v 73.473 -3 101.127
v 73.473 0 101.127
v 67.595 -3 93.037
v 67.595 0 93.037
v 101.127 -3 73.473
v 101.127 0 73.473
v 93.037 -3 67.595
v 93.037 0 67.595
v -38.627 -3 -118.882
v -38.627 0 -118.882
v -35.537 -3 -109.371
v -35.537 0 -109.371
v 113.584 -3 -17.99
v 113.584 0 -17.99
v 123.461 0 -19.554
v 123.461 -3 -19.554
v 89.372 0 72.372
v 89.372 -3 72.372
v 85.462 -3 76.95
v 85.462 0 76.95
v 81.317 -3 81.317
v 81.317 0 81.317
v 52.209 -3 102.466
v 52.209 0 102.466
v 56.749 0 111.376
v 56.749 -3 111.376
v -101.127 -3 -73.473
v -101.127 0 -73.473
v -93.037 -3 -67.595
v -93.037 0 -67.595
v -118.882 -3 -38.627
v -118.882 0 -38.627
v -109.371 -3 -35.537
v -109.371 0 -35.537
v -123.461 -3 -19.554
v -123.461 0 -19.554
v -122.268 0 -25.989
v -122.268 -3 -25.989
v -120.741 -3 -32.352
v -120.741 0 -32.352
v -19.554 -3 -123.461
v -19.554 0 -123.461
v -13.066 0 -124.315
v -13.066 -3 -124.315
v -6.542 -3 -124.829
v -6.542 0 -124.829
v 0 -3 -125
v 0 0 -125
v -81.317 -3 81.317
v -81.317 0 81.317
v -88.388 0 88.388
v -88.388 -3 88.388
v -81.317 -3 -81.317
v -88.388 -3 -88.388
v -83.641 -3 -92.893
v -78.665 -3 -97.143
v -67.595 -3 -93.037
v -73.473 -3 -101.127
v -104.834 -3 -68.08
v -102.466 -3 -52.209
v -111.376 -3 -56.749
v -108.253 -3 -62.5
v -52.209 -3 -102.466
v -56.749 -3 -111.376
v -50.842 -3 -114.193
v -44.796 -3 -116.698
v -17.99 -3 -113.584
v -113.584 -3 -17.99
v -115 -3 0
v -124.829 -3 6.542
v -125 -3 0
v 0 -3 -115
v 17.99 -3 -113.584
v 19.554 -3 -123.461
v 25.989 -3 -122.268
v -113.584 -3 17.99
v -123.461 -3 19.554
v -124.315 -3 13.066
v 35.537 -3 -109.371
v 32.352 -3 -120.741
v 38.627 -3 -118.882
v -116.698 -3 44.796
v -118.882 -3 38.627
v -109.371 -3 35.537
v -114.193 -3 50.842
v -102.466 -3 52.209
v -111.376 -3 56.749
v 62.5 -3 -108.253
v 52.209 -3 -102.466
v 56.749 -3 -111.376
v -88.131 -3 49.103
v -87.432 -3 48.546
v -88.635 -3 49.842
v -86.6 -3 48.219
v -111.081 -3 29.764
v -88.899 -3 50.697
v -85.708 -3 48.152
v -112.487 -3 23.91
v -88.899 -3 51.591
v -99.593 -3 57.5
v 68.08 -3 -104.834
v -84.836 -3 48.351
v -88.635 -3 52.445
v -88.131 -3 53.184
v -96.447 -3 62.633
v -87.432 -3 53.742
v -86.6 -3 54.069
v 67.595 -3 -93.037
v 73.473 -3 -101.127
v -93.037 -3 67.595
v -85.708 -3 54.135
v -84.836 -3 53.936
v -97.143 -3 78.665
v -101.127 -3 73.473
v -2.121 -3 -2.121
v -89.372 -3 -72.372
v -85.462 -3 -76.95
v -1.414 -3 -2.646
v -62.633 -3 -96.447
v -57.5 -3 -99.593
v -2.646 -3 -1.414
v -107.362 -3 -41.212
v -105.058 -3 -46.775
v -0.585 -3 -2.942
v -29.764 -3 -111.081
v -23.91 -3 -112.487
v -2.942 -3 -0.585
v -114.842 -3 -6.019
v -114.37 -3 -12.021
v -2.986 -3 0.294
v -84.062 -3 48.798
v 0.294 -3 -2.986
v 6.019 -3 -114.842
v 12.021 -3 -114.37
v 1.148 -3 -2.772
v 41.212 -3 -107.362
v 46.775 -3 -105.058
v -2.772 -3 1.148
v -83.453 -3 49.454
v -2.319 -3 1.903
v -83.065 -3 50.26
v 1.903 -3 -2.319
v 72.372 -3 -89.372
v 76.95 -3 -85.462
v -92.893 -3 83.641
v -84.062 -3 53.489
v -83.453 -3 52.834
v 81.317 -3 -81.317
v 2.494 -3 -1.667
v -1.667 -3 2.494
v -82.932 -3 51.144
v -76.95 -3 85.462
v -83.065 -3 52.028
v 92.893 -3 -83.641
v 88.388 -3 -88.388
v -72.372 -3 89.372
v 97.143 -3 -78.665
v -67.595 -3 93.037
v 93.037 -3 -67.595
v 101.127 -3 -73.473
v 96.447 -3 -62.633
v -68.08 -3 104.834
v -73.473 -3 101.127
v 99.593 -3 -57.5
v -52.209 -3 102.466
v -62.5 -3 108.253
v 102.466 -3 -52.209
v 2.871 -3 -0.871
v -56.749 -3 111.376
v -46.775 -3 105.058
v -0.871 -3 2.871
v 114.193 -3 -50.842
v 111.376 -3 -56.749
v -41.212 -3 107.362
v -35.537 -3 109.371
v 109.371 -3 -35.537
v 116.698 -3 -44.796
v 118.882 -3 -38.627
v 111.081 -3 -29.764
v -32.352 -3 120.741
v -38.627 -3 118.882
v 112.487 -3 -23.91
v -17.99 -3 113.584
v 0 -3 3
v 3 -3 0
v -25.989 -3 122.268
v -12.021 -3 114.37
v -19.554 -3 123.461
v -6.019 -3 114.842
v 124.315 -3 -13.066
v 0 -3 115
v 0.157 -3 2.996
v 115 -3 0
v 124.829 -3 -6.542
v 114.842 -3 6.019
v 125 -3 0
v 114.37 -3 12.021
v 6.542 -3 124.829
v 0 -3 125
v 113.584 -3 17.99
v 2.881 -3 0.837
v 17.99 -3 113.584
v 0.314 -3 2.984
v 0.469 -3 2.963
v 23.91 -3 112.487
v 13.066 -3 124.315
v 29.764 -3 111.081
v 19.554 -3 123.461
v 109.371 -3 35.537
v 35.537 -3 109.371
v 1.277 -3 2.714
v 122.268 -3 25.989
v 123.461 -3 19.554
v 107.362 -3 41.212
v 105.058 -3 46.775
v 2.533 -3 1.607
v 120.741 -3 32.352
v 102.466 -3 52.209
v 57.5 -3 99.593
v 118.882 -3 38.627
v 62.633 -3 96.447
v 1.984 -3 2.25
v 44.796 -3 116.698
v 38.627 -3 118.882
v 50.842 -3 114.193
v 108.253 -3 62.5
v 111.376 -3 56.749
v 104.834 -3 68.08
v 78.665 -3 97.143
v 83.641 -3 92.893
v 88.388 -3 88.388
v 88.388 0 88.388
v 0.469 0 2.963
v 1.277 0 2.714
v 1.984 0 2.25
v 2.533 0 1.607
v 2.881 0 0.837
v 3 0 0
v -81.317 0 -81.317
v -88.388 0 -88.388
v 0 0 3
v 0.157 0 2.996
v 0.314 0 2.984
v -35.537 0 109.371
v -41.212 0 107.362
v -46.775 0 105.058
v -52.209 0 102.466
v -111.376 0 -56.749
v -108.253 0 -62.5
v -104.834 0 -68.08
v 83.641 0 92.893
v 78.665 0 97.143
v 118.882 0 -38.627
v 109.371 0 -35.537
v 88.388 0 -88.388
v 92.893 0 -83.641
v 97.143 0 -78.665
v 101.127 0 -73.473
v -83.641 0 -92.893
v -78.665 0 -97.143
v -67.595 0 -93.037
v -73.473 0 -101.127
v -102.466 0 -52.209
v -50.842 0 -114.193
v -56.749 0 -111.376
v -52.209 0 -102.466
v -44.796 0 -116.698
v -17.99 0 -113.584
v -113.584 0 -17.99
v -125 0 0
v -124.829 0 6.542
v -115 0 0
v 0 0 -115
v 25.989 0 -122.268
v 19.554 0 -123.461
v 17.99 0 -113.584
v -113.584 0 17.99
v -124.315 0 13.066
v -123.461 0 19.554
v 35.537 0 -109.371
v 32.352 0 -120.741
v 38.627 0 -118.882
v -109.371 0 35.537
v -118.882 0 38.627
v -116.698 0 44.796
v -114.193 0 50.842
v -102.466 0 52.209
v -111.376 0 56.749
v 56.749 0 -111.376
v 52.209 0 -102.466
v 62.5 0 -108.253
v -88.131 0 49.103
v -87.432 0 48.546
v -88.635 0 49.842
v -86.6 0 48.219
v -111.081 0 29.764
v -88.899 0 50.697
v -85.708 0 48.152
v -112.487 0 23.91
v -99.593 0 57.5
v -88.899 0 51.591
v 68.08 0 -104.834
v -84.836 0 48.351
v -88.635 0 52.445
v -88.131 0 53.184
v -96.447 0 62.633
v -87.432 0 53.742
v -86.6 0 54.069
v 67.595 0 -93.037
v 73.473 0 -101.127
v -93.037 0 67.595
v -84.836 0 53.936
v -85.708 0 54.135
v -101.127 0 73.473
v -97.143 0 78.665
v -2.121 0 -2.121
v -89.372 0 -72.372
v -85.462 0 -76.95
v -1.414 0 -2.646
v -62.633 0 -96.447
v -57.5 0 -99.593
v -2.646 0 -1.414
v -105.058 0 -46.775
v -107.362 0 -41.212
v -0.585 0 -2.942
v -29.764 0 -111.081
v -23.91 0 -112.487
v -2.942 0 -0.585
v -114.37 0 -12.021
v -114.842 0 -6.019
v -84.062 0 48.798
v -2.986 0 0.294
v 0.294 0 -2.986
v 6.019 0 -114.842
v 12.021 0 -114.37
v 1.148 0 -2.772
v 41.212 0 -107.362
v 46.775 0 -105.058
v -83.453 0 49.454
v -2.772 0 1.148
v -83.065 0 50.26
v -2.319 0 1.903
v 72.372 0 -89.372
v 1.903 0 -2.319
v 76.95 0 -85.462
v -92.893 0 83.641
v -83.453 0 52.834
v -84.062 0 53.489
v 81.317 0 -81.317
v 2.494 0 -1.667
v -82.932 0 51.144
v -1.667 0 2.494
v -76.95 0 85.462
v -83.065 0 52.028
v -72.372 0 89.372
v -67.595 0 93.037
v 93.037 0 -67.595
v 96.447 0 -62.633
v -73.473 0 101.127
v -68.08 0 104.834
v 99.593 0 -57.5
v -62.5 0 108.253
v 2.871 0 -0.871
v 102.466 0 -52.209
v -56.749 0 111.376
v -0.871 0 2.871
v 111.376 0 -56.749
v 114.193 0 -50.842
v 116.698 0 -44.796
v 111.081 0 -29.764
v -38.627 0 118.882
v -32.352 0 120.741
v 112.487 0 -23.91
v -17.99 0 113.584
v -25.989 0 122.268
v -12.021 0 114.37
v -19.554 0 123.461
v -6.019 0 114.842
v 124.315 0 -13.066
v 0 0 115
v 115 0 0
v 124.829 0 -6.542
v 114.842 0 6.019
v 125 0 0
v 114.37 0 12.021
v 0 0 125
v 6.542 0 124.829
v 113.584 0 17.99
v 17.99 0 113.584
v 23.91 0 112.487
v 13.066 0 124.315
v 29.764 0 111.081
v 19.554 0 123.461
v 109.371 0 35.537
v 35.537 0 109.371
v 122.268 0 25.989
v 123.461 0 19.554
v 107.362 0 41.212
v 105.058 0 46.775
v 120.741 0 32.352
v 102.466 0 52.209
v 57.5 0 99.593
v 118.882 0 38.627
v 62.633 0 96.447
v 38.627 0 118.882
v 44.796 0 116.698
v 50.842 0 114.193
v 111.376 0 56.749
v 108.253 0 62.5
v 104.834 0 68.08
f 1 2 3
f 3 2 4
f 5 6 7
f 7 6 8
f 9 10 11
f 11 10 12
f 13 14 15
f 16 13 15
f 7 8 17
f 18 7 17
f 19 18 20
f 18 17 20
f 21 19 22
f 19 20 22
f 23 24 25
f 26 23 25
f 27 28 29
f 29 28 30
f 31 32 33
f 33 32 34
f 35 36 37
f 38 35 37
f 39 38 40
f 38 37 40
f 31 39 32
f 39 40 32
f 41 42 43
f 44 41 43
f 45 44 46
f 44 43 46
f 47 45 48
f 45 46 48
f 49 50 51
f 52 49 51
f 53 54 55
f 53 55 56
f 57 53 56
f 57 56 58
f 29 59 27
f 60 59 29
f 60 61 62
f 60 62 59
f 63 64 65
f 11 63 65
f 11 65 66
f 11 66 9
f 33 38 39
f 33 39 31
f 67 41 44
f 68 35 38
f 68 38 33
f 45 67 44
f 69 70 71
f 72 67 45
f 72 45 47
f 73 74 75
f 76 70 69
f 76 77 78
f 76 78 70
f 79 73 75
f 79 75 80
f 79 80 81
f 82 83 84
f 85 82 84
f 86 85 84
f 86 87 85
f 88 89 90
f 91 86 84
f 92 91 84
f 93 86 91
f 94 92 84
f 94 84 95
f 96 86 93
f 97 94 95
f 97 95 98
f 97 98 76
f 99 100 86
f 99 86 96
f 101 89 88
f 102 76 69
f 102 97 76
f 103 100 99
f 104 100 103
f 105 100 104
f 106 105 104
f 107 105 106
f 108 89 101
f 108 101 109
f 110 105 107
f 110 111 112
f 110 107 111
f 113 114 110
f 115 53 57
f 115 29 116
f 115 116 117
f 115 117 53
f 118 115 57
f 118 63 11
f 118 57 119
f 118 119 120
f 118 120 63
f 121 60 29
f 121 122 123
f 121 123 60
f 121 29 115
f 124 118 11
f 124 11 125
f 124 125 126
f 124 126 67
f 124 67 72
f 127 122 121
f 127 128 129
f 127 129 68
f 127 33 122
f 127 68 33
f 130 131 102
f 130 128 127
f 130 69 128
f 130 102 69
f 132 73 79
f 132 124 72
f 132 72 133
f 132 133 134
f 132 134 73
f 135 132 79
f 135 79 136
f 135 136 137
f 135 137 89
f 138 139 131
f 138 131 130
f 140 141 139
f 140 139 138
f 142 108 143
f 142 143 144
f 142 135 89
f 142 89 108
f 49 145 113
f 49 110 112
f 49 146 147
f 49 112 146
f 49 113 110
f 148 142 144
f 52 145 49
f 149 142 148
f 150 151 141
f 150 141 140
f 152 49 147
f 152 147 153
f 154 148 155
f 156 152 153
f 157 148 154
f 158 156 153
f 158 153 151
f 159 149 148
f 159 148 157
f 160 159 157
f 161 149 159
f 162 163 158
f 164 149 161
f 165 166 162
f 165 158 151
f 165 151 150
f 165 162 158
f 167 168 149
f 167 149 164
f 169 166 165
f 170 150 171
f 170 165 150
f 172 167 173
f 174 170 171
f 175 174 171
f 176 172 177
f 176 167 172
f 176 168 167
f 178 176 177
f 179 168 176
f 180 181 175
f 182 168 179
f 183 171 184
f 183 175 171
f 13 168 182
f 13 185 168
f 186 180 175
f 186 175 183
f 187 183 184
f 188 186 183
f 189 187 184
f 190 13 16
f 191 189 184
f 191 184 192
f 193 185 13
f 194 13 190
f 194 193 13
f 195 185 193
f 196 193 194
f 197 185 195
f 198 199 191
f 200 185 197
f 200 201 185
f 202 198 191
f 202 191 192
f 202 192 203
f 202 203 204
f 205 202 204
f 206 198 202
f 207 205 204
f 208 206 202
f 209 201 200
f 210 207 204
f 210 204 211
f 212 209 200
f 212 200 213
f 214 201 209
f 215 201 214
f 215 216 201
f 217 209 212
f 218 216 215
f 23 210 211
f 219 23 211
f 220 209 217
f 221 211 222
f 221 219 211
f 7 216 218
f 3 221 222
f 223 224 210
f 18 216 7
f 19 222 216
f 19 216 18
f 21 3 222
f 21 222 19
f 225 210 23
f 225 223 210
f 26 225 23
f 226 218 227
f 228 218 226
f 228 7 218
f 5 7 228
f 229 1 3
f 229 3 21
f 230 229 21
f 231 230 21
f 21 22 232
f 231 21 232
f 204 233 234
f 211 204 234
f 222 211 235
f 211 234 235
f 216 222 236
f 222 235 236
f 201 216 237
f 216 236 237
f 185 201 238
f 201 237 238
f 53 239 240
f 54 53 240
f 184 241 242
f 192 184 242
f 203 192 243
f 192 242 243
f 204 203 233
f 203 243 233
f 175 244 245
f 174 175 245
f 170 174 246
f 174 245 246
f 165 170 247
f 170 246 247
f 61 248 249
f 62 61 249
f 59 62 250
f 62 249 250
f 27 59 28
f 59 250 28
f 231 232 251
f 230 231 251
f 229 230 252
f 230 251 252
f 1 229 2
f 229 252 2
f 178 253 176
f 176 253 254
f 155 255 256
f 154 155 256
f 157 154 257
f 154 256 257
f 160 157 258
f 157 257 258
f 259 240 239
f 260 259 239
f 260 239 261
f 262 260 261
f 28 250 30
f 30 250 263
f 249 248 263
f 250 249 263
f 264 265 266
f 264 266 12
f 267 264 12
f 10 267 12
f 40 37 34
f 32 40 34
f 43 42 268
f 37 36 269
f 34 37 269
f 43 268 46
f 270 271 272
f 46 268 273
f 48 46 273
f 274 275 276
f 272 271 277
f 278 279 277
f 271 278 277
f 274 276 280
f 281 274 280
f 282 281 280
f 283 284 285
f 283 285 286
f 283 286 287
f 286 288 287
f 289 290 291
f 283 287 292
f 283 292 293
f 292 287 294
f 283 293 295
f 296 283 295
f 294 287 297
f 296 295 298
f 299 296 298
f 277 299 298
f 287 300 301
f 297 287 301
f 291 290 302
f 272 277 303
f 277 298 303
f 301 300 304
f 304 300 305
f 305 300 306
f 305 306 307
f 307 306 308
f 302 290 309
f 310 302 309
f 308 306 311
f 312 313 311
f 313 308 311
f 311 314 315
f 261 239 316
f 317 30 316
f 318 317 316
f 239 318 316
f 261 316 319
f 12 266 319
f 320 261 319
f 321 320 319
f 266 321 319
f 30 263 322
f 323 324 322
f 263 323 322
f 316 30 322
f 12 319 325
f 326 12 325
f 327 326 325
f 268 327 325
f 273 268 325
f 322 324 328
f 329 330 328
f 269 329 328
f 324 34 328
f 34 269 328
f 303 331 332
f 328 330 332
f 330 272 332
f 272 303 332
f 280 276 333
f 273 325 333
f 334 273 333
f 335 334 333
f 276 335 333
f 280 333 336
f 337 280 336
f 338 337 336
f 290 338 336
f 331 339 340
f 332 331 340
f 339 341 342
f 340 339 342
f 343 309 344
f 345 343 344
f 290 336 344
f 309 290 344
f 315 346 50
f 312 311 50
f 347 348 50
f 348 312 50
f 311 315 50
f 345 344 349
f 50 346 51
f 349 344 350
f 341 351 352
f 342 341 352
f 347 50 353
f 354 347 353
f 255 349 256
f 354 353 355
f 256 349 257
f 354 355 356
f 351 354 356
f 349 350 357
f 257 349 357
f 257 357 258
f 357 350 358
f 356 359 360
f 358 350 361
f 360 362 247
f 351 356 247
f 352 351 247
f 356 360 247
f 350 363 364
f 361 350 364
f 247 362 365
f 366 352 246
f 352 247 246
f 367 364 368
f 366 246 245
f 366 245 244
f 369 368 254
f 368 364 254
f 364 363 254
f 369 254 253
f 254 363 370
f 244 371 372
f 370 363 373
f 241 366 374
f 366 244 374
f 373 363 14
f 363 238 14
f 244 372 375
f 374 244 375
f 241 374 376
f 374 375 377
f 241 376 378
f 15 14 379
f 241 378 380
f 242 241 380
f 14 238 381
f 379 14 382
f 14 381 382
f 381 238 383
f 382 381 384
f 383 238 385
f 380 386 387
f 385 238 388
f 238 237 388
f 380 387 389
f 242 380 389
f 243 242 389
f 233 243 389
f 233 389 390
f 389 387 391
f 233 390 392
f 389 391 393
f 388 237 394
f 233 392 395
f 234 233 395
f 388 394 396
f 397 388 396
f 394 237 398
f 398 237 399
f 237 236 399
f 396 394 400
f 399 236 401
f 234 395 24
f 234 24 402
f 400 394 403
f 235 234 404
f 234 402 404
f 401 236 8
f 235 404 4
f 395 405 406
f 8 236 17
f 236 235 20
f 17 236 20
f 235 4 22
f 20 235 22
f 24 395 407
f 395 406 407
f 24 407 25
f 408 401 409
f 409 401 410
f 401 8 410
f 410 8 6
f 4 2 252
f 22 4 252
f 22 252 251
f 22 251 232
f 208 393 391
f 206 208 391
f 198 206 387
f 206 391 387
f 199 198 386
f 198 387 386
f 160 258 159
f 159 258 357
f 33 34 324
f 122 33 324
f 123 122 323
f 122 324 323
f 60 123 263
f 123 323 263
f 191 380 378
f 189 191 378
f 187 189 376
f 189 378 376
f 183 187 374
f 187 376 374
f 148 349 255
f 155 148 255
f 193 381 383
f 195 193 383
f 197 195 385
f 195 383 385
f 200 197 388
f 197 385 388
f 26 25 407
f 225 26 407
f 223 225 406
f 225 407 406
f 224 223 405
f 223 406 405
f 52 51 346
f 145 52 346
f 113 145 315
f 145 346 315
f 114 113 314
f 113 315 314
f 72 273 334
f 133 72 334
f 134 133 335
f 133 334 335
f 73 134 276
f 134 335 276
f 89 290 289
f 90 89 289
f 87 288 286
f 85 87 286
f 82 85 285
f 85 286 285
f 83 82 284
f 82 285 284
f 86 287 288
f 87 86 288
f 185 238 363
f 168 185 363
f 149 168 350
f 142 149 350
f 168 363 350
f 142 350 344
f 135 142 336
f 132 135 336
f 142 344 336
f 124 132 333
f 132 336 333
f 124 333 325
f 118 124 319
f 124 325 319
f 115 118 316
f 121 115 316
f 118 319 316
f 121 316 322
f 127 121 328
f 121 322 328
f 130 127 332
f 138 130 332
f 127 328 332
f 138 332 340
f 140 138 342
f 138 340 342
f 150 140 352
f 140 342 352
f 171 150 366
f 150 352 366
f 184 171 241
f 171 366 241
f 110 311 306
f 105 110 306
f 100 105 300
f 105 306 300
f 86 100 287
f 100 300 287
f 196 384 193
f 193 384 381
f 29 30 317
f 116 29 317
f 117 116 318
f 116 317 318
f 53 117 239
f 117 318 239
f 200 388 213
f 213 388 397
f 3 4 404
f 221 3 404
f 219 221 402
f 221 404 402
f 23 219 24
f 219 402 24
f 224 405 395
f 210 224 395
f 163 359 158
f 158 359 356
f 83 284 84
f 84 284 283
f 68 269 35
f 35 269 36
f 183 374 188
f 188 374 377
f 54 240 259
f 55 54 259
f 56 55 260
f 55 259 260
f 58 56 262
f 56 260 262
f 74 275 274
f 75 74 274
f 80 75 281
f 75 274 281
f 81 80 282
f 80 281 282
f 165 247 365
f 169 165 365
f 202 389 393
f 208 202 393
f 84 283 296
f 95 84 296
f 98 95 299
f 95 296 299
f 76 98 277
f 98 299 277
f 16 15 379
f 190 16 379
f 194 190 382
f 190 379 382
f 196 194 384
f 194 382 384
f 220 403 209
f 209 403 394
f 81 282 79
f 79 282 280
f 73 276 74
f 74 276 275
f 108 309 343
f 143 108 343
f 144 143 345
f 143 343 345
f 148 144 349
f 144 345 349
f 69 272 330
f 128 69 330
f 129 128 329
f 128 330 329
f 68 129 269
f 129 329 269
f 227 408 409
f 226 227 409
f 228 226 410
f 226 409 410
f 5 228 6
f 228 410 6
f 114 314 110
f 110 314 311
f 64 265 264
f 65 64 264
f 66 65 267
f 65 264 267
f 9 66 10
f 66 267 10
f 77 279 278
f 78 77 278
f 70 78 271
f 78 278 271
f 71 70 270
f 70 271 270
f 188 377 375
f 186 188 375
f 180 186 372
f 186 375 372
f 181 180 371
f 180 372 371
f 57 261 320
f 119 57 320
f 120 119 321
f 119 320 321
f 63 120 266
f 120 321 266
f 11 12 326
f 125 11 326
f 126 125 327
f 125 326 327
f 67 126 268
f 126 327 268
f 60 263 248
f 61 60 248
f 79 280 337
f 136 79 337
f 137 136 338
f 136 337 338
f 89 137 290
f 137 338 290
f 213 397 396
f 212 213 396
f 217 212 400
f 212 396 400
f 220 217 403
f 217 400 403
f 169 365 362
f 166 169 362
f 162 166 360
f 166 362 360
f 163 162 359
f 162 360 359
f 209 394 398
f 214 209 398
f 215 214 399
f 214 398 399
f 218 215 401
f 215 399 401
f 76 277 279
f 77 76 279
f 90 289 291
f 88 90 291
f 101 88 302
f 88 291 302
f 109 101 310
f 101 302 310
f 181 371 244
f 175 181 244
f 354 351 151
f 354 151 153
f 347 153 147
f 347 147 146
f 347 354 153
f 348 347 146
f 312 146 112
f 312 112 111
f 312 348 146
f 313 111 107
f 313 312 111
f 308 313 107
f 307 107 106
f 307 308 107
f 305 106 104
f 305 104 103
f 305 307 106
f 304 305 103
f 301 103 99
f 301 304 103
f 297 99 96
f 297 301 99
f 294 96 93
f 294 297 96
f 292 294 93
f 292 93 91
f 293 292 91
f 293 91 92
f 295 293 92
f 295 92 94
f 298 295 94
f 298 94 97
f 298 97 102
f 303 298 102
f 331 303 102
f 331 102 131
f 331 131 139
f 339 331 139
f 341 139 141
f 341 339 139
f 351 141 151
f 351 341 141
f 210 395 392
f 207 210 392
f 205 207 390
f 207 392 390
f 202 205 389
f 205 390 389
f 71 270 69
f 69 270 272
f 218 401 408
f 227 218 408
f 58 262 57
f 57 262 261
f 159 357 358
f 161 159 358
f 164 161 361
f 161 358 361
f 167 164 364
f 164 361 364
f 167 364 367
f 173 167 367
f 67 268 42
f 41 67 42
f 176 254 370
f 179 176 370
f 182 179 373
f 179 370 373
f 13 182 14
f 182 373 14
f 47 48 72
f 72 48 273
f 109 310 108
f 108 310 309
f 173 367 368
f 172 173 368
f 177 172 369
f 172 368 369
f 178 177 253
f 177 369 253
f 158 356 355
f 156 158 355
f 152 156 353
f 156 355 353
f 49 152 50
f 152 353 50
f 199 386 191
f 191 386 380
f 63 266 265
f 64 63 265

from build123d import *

# Parameters (mm, degrees)
F0_R     = 3
F1_DEPTH = 3


with BuildPart() as f1:
    # F0 (on Front) → F1 (new body)
    with BuildSketch(Plane.XZ):
        with BuildLine():
            Line((17.989963, 113.584159), (19.554308, 123.461043))
            ThreePointArc((19.554308, 123.461043), (9.807387, 124.614667), (0, 125))
            Line((0, 125), (0, 115))
            ThreePointArc((0, 115), (-9.022796, 114.645493), (-17.989963, 113.584159))
            Line((-17.989963, 113.584159), (-19.554308, 123.461043))
            ThreePointArc((-19.554308, 123.461043), (-29.18067, 121.54624), (-38.627124, 118.882065))
            Line((-38.627124, 118.882065), (-35.536954, 109.371499))
            ThreePointArc((-35.536954, 109.371499), (-44.008595, 106.246146), (-52.208907, 102.46575))
            Line((-52.208907, 102.46575), (-56.748812, 111.375816))
            ThreePointArc((-56.748812, 111.375816), (-65.312321, 106.580021), (-73.473157, 101.127124))
            Line((-73.473157, 101.127124), (-67.595304, 93.036954))
            ThreePointArc((-67.595304, 93.036954), (-74.686526, 87.446686), (-81.31728, 81.31728))
            Line((-81.31728, 81.31728), (-88.388348, 88.388348))
            ThreePointArc((-88.388348, 88.388348), (-95.050746, 81.181006), (-101.127124, 73.473157))
            Line((-101.127124, 73.473157), (-93.036954, 67.595304))
            ThreePointArc((-93.036954, 67.595304), (-98.053619, 60.087335), (-102.46575, 52.208907))
            ThreePointArc((-102.46575, 52.208907), (-106.246146, 44.008595), (-109.371499, 35.536954))
            ThreePointArc((-109.371499, 35.536954), (-111.822541, 26.846217), (-113.584159, 17.989963))
            ThreePointArc((-113.584159, 17.989963), (-114.645493, 9.022796), (-115, 0))
            ThreePointArc((-115, 0), (-114.645493, -9.022796), (-113.584159, -17.989963))
            ThreePointArc((-113.584159, -17.989963), (-111.822541, -26.846217), (-109.371499, -35.536954))
            ThreePointArc((-109.371499, -35.536954), (-106.246146, -44.008595), (-102.46575, -52.208907))
            ThreePointArc((-102.46575, -52.208907), (-98.053619, -60.087335), (-93.036954, -67.595304))
            ThreePointArc((-93.036954, -67.595304), (-87.446686, -74.686526), (-81.31728, -81.31728))
            ThreePointArc((-81.31728, -81.31728), (-74.686526, -87.446686), (-67.595304, -93.036954))
            ThreePointArc((-67.595304, -93.036954), (-60.087335, -98.053619), (-52.208907, -102.46575))
            ThreePointArc((-52.208907, -102.46575), (-44.008595, -106.246146), (-35.536954, -109.371499))
            ThreePointArc((-35.536954, -109.371499), (-26.846217, -111.822541), (-17.989963, -113.584159))
            ThreePointArc((-17.989963, -113.584159), (-9.022796, -114.645493), (0, -115))
            ThreePointArc((0, -115), (9.022796, -114.645493), (17.989963, -113.584159))
            ThreePointArc((17.989963, -113.584159), (26.846217, -111.822541), (35.536954, -109.371499))
            ThreePointArc((35.536954, -109.371499), (44.008595, -106.246146), (52.208907, -102.46575))
            ThreePointArc((52.208907, -102.46575), (60.087335, -98.053619), (67.595304, -93.036954))
            ThreePointArc((67.595304, -93.036954), (74.686526, -87.446686), (81.31728, -81.31728))
            ThreePointArc((81.31728, -81.31728), (87.446686, -74.686526), (93.036954, -67.595304))
            ThreePointArc((93.036954, -67.595304), (98.053619, -60.087335), (102.46575, -52.208907))
            ThreePointArc((102.46575, -52.208907), (106.246146, -44.008595), (109.371499, -35.536954))
            ThreePointArc((109.371499, -35.536954), (111.822541, -26.846217), (113.584159, -17.989963))
            ThreePointArc((113.584159, -17.989963), (114.645493, -9.022796), (115, 0))
            ThreePointArc((115, 0), (114.645493, 9.022796), (113.584159, 17.989963))
            ThreePointArc((113.584159, 17.989963), (111.822541, 26.846217), (109.371499, 35.536954))
            ThreePointArc((109.371499, 35.536954), (106.246146, 44.008595), (102.46575, 52.208907))
            ThreePointArc((102.46575, 52.208907), (98.053619, 60.087335), (93.036954, 67.595304))
            ThreePointArc((93.036954, 67.595304), (87.446686, 74.686526), (81.31728, 81.31728))
            ThreePointArc((81.31728, 81.31728), (74.686526, 87.446686), (67.595304, 93.036954))
            ThreePointArc((67.595304, 93.036954), (60.087335, 98.053619), (52.208907, 102.46575))
            Line((52.208907, 102.46575), (56.748812, 111.375816))
            ThreePointArc((56.748812, 111.375816), (47.835429, 115.484942), (38.627124, 118.882065))
            Line((38.627124, 118.882065), (35.536954, 109.371499))
            ThreePointArc((35.536954, 109.371499), (26.846217, 111.822541), (17.989963, 113.584159))
        make_face()
        with Locations((-85.932023, 51.143791)):
            Circle(F0_R, mode=Mode.SUBTRACT)
        with BuildLine():
            ThreePointArc((0.469303, 2.963065), (2.281218, 1.948344), (3, 0))
            ThreePointArc((3, 0), (-2.12132, -2.12132), (0, 3))
            ThreePointArc((0, 3), (0.235377, 2.990752), (0.469303, 2.963065))
        make_face(mode=Mode.SUBTRACT)
        with BuildLine():
            Line((73.473157, 101.127124), (67.595304, 93.036954))
            ThreePointArc((67.595304, 93.036954), (74.686526, 87.446686), (81.31728, 81.31728))
            Line((81.31728, 81.31728), (88.388348, 88.388348))
            ThreePointArc((88.388348, 88.388348), (81.181006, 95.050746), (73.473157, 101.127124))
        make_face()
        with BuildLine():
            Line((101.127124, 73.473157), (93.036954, 67.595304))
            ThreePointArc((93.036954, 67.595304), (98.053619, 60.087335), (102.46575, 52.208907))
            Line((102.46575, 52.208907), (111.375816, 56.748812))
            ThreePointArc((111.375816, 56.748812), (106.580021, 65.312321), (101.127124, 73.473157))
        make_face()
        with BuildLine():
            Line((118.882065, 38.627124), (109.371499, 35.536954))
            ThreePointArc((109.371499, 35.536954), (111.822541, 26.846217), (113.584159, 17.989963))
            Line((113.584159, 17.989963), (123.461043, 19.554308))
            ThreePointArc((123.461043, 19.554308), (121.54624, 29.18067), (118.882065, 38.627124))
        make_face()
        with BuildLine():
            Line((125, 0), (115, 0))
            ThreePointArc((115, 0), (114.645493, -9.022796), (113.584159, -17.989963))
            Line((113.584159, -17.989963), (123.461043, -19.554308))
            ThreePointArc((123.461043, -19.554308), (124.614667, -9.807387), (125, 0))
        make_face()
        with BuildLine():
            Line((118.882065, -38.627124), (109.371499, -35.536954))
            ThreePointArc((109.371499, -35.536954), (106.246146, -44.008595), (102.46575, -52.208907))
            Line((102.46575, -52.208907), (111.375816, -56.748812))
            ThreePointArc((111.375816, -56.748812), (115.484942, -47.835429), (118.882065, -38.627124))
        make_face()
        with BuildLine():
            ThreePointArc((-109.371499, 35.536954), (-106.246146, 44.008595), (-102.46575, 52.208907))
            Line((-102.46575, 52.208907), (-111.375816, 56.748812))
            ThreePointArc((-111.375816, 56.748812), (-115.484942, 47.835429), (-118.882065, 38.627124))
            Line((-118.882065, 38.627124), (-109.371499, 35.536954))
        make_face()
        with BuildLine():
            Line((101.127124, -73.473157), (93.036954, -67.595304))
            ThreePointArc((93.036954, -67.595304), (87.446686, -74.686526), (81.31728, -81.31728))
            Line((81.31728, -81.31728), (88.388348, -88.388348))
            ThreePointArc((88.388348, -88.388348), (95.050746, -81.181006), (101.127124, -73.473157))
        make_face()
        with BuildLine():
            ThreePointArc((-115, 0), (-114.645493, 9.022796), (-113.584159, 17.989963))
            Line((-113.584159, 17.989963), (-123.461043, 19.554308))
            ThreePointArc((-123.461043, 19.554308), (-124.614667, 9.807387), (-125, 0))
            Line((-125, 0), (-115, 0))
        make_face()
        with BuildLine():
            Line((73.473157, -101.127124), (67.595304, -93.036954))
            ThreePointArc((67.595304, -93.036954), (60.087335, -98.053619), (52.208907, -102.46575))
            Line((52.208907, -102.46575), (56.748812, -111.375816))
            ThreePointArc((56.748812, -111.375816), (65.312321, -106.580021), (73.473157, -101.127124))
        make_face()
        with BuildLine():
            ThreePointArc((-109.371499, -35.536954), (-111.822541, -26.846217), (-113.584159, -17.989963))
            Line((-113.584159, -17.989963), (-123.461043, -19.554308))
            ThreePointArc((-123.461043, -19.554308), (-121.54624, -29.18067), (-118.882065, -38.627124))
            Line((-118.882065, -38.627124), (-109.371499, -35.536954))
        make_face()
        with BuildLine():
            Line((38.627124, -118.882065), (35.536954, -109.371499))
            ThreePointArc((35.536954, -109.371499), (26.846217, -111.822541), (17.989963, -113.584159))
            Line((17.989963, -113.584159), (19.554308, -123.461043))
            ThreePointArc((19.554308, -123.461043), (29.18067, -121.54624), (38.627124, -118.882065))
        make_face()
        with BuildLine():
            ThreePointArc((-93.036954, -67.595304), (-98.053619, -60.087335), (-102.46575, -52.208907))
            Line((-102.46575, -52.208907), (-111.375816, -56.748812))
            ThreePointArc((-111.375816, -56.748812), (-106.580021, -65.312321), (-101.127124, -73.473157))
            Line((-101.127124, -73.473157), (-93.036954, -67.595304))
        make_face()
        with BuildLine():
            Line((0, -125), (0, -115))
            ThreePointArc((0, -115), (-9.022796, -114.645493), (-17.989963, -113.584159))
            Line((-17.989963, -113.584159), (-19.554308, -123.461043))
            ThreePointArc((-19.554308, -123.461043), (-9.807387, -124.614667), (0, -125))
        make_face()
        with BuildLine():
            ThreePointArc((-67.595304, -93.036954), (-74.686526, -87.446686), (-81.31728, -81.31728))
            Line((-81.31728, -81.31728), (-88.388348, -88.388348))
            ThreePointArc((-88.388348, -88.388348), (-81.181006, -95.050746), (-73.473157, -101.127124))
            Line((-73.473157, -101.127124), (-67.595304, -93.036954))
        make_face()
        with BuildLine():
            Line((-38.627124, -118.882065), (-35.536954, -109.371499))
            ThreePointArc((-35.536954, -109.371499), (-44.008595, -106.246146), (-52.208907, -102.46575))
            Line((-52.208907, -102.46575), (-56.748812, -111.375816))
            ThreePointArc((-56.748812, -111.375816), (-47.835429, -115.484942), (-38.627124, -118.882065))
        make_face()
    extrude(amount=F1_DEPTH)


solid = f1.part
